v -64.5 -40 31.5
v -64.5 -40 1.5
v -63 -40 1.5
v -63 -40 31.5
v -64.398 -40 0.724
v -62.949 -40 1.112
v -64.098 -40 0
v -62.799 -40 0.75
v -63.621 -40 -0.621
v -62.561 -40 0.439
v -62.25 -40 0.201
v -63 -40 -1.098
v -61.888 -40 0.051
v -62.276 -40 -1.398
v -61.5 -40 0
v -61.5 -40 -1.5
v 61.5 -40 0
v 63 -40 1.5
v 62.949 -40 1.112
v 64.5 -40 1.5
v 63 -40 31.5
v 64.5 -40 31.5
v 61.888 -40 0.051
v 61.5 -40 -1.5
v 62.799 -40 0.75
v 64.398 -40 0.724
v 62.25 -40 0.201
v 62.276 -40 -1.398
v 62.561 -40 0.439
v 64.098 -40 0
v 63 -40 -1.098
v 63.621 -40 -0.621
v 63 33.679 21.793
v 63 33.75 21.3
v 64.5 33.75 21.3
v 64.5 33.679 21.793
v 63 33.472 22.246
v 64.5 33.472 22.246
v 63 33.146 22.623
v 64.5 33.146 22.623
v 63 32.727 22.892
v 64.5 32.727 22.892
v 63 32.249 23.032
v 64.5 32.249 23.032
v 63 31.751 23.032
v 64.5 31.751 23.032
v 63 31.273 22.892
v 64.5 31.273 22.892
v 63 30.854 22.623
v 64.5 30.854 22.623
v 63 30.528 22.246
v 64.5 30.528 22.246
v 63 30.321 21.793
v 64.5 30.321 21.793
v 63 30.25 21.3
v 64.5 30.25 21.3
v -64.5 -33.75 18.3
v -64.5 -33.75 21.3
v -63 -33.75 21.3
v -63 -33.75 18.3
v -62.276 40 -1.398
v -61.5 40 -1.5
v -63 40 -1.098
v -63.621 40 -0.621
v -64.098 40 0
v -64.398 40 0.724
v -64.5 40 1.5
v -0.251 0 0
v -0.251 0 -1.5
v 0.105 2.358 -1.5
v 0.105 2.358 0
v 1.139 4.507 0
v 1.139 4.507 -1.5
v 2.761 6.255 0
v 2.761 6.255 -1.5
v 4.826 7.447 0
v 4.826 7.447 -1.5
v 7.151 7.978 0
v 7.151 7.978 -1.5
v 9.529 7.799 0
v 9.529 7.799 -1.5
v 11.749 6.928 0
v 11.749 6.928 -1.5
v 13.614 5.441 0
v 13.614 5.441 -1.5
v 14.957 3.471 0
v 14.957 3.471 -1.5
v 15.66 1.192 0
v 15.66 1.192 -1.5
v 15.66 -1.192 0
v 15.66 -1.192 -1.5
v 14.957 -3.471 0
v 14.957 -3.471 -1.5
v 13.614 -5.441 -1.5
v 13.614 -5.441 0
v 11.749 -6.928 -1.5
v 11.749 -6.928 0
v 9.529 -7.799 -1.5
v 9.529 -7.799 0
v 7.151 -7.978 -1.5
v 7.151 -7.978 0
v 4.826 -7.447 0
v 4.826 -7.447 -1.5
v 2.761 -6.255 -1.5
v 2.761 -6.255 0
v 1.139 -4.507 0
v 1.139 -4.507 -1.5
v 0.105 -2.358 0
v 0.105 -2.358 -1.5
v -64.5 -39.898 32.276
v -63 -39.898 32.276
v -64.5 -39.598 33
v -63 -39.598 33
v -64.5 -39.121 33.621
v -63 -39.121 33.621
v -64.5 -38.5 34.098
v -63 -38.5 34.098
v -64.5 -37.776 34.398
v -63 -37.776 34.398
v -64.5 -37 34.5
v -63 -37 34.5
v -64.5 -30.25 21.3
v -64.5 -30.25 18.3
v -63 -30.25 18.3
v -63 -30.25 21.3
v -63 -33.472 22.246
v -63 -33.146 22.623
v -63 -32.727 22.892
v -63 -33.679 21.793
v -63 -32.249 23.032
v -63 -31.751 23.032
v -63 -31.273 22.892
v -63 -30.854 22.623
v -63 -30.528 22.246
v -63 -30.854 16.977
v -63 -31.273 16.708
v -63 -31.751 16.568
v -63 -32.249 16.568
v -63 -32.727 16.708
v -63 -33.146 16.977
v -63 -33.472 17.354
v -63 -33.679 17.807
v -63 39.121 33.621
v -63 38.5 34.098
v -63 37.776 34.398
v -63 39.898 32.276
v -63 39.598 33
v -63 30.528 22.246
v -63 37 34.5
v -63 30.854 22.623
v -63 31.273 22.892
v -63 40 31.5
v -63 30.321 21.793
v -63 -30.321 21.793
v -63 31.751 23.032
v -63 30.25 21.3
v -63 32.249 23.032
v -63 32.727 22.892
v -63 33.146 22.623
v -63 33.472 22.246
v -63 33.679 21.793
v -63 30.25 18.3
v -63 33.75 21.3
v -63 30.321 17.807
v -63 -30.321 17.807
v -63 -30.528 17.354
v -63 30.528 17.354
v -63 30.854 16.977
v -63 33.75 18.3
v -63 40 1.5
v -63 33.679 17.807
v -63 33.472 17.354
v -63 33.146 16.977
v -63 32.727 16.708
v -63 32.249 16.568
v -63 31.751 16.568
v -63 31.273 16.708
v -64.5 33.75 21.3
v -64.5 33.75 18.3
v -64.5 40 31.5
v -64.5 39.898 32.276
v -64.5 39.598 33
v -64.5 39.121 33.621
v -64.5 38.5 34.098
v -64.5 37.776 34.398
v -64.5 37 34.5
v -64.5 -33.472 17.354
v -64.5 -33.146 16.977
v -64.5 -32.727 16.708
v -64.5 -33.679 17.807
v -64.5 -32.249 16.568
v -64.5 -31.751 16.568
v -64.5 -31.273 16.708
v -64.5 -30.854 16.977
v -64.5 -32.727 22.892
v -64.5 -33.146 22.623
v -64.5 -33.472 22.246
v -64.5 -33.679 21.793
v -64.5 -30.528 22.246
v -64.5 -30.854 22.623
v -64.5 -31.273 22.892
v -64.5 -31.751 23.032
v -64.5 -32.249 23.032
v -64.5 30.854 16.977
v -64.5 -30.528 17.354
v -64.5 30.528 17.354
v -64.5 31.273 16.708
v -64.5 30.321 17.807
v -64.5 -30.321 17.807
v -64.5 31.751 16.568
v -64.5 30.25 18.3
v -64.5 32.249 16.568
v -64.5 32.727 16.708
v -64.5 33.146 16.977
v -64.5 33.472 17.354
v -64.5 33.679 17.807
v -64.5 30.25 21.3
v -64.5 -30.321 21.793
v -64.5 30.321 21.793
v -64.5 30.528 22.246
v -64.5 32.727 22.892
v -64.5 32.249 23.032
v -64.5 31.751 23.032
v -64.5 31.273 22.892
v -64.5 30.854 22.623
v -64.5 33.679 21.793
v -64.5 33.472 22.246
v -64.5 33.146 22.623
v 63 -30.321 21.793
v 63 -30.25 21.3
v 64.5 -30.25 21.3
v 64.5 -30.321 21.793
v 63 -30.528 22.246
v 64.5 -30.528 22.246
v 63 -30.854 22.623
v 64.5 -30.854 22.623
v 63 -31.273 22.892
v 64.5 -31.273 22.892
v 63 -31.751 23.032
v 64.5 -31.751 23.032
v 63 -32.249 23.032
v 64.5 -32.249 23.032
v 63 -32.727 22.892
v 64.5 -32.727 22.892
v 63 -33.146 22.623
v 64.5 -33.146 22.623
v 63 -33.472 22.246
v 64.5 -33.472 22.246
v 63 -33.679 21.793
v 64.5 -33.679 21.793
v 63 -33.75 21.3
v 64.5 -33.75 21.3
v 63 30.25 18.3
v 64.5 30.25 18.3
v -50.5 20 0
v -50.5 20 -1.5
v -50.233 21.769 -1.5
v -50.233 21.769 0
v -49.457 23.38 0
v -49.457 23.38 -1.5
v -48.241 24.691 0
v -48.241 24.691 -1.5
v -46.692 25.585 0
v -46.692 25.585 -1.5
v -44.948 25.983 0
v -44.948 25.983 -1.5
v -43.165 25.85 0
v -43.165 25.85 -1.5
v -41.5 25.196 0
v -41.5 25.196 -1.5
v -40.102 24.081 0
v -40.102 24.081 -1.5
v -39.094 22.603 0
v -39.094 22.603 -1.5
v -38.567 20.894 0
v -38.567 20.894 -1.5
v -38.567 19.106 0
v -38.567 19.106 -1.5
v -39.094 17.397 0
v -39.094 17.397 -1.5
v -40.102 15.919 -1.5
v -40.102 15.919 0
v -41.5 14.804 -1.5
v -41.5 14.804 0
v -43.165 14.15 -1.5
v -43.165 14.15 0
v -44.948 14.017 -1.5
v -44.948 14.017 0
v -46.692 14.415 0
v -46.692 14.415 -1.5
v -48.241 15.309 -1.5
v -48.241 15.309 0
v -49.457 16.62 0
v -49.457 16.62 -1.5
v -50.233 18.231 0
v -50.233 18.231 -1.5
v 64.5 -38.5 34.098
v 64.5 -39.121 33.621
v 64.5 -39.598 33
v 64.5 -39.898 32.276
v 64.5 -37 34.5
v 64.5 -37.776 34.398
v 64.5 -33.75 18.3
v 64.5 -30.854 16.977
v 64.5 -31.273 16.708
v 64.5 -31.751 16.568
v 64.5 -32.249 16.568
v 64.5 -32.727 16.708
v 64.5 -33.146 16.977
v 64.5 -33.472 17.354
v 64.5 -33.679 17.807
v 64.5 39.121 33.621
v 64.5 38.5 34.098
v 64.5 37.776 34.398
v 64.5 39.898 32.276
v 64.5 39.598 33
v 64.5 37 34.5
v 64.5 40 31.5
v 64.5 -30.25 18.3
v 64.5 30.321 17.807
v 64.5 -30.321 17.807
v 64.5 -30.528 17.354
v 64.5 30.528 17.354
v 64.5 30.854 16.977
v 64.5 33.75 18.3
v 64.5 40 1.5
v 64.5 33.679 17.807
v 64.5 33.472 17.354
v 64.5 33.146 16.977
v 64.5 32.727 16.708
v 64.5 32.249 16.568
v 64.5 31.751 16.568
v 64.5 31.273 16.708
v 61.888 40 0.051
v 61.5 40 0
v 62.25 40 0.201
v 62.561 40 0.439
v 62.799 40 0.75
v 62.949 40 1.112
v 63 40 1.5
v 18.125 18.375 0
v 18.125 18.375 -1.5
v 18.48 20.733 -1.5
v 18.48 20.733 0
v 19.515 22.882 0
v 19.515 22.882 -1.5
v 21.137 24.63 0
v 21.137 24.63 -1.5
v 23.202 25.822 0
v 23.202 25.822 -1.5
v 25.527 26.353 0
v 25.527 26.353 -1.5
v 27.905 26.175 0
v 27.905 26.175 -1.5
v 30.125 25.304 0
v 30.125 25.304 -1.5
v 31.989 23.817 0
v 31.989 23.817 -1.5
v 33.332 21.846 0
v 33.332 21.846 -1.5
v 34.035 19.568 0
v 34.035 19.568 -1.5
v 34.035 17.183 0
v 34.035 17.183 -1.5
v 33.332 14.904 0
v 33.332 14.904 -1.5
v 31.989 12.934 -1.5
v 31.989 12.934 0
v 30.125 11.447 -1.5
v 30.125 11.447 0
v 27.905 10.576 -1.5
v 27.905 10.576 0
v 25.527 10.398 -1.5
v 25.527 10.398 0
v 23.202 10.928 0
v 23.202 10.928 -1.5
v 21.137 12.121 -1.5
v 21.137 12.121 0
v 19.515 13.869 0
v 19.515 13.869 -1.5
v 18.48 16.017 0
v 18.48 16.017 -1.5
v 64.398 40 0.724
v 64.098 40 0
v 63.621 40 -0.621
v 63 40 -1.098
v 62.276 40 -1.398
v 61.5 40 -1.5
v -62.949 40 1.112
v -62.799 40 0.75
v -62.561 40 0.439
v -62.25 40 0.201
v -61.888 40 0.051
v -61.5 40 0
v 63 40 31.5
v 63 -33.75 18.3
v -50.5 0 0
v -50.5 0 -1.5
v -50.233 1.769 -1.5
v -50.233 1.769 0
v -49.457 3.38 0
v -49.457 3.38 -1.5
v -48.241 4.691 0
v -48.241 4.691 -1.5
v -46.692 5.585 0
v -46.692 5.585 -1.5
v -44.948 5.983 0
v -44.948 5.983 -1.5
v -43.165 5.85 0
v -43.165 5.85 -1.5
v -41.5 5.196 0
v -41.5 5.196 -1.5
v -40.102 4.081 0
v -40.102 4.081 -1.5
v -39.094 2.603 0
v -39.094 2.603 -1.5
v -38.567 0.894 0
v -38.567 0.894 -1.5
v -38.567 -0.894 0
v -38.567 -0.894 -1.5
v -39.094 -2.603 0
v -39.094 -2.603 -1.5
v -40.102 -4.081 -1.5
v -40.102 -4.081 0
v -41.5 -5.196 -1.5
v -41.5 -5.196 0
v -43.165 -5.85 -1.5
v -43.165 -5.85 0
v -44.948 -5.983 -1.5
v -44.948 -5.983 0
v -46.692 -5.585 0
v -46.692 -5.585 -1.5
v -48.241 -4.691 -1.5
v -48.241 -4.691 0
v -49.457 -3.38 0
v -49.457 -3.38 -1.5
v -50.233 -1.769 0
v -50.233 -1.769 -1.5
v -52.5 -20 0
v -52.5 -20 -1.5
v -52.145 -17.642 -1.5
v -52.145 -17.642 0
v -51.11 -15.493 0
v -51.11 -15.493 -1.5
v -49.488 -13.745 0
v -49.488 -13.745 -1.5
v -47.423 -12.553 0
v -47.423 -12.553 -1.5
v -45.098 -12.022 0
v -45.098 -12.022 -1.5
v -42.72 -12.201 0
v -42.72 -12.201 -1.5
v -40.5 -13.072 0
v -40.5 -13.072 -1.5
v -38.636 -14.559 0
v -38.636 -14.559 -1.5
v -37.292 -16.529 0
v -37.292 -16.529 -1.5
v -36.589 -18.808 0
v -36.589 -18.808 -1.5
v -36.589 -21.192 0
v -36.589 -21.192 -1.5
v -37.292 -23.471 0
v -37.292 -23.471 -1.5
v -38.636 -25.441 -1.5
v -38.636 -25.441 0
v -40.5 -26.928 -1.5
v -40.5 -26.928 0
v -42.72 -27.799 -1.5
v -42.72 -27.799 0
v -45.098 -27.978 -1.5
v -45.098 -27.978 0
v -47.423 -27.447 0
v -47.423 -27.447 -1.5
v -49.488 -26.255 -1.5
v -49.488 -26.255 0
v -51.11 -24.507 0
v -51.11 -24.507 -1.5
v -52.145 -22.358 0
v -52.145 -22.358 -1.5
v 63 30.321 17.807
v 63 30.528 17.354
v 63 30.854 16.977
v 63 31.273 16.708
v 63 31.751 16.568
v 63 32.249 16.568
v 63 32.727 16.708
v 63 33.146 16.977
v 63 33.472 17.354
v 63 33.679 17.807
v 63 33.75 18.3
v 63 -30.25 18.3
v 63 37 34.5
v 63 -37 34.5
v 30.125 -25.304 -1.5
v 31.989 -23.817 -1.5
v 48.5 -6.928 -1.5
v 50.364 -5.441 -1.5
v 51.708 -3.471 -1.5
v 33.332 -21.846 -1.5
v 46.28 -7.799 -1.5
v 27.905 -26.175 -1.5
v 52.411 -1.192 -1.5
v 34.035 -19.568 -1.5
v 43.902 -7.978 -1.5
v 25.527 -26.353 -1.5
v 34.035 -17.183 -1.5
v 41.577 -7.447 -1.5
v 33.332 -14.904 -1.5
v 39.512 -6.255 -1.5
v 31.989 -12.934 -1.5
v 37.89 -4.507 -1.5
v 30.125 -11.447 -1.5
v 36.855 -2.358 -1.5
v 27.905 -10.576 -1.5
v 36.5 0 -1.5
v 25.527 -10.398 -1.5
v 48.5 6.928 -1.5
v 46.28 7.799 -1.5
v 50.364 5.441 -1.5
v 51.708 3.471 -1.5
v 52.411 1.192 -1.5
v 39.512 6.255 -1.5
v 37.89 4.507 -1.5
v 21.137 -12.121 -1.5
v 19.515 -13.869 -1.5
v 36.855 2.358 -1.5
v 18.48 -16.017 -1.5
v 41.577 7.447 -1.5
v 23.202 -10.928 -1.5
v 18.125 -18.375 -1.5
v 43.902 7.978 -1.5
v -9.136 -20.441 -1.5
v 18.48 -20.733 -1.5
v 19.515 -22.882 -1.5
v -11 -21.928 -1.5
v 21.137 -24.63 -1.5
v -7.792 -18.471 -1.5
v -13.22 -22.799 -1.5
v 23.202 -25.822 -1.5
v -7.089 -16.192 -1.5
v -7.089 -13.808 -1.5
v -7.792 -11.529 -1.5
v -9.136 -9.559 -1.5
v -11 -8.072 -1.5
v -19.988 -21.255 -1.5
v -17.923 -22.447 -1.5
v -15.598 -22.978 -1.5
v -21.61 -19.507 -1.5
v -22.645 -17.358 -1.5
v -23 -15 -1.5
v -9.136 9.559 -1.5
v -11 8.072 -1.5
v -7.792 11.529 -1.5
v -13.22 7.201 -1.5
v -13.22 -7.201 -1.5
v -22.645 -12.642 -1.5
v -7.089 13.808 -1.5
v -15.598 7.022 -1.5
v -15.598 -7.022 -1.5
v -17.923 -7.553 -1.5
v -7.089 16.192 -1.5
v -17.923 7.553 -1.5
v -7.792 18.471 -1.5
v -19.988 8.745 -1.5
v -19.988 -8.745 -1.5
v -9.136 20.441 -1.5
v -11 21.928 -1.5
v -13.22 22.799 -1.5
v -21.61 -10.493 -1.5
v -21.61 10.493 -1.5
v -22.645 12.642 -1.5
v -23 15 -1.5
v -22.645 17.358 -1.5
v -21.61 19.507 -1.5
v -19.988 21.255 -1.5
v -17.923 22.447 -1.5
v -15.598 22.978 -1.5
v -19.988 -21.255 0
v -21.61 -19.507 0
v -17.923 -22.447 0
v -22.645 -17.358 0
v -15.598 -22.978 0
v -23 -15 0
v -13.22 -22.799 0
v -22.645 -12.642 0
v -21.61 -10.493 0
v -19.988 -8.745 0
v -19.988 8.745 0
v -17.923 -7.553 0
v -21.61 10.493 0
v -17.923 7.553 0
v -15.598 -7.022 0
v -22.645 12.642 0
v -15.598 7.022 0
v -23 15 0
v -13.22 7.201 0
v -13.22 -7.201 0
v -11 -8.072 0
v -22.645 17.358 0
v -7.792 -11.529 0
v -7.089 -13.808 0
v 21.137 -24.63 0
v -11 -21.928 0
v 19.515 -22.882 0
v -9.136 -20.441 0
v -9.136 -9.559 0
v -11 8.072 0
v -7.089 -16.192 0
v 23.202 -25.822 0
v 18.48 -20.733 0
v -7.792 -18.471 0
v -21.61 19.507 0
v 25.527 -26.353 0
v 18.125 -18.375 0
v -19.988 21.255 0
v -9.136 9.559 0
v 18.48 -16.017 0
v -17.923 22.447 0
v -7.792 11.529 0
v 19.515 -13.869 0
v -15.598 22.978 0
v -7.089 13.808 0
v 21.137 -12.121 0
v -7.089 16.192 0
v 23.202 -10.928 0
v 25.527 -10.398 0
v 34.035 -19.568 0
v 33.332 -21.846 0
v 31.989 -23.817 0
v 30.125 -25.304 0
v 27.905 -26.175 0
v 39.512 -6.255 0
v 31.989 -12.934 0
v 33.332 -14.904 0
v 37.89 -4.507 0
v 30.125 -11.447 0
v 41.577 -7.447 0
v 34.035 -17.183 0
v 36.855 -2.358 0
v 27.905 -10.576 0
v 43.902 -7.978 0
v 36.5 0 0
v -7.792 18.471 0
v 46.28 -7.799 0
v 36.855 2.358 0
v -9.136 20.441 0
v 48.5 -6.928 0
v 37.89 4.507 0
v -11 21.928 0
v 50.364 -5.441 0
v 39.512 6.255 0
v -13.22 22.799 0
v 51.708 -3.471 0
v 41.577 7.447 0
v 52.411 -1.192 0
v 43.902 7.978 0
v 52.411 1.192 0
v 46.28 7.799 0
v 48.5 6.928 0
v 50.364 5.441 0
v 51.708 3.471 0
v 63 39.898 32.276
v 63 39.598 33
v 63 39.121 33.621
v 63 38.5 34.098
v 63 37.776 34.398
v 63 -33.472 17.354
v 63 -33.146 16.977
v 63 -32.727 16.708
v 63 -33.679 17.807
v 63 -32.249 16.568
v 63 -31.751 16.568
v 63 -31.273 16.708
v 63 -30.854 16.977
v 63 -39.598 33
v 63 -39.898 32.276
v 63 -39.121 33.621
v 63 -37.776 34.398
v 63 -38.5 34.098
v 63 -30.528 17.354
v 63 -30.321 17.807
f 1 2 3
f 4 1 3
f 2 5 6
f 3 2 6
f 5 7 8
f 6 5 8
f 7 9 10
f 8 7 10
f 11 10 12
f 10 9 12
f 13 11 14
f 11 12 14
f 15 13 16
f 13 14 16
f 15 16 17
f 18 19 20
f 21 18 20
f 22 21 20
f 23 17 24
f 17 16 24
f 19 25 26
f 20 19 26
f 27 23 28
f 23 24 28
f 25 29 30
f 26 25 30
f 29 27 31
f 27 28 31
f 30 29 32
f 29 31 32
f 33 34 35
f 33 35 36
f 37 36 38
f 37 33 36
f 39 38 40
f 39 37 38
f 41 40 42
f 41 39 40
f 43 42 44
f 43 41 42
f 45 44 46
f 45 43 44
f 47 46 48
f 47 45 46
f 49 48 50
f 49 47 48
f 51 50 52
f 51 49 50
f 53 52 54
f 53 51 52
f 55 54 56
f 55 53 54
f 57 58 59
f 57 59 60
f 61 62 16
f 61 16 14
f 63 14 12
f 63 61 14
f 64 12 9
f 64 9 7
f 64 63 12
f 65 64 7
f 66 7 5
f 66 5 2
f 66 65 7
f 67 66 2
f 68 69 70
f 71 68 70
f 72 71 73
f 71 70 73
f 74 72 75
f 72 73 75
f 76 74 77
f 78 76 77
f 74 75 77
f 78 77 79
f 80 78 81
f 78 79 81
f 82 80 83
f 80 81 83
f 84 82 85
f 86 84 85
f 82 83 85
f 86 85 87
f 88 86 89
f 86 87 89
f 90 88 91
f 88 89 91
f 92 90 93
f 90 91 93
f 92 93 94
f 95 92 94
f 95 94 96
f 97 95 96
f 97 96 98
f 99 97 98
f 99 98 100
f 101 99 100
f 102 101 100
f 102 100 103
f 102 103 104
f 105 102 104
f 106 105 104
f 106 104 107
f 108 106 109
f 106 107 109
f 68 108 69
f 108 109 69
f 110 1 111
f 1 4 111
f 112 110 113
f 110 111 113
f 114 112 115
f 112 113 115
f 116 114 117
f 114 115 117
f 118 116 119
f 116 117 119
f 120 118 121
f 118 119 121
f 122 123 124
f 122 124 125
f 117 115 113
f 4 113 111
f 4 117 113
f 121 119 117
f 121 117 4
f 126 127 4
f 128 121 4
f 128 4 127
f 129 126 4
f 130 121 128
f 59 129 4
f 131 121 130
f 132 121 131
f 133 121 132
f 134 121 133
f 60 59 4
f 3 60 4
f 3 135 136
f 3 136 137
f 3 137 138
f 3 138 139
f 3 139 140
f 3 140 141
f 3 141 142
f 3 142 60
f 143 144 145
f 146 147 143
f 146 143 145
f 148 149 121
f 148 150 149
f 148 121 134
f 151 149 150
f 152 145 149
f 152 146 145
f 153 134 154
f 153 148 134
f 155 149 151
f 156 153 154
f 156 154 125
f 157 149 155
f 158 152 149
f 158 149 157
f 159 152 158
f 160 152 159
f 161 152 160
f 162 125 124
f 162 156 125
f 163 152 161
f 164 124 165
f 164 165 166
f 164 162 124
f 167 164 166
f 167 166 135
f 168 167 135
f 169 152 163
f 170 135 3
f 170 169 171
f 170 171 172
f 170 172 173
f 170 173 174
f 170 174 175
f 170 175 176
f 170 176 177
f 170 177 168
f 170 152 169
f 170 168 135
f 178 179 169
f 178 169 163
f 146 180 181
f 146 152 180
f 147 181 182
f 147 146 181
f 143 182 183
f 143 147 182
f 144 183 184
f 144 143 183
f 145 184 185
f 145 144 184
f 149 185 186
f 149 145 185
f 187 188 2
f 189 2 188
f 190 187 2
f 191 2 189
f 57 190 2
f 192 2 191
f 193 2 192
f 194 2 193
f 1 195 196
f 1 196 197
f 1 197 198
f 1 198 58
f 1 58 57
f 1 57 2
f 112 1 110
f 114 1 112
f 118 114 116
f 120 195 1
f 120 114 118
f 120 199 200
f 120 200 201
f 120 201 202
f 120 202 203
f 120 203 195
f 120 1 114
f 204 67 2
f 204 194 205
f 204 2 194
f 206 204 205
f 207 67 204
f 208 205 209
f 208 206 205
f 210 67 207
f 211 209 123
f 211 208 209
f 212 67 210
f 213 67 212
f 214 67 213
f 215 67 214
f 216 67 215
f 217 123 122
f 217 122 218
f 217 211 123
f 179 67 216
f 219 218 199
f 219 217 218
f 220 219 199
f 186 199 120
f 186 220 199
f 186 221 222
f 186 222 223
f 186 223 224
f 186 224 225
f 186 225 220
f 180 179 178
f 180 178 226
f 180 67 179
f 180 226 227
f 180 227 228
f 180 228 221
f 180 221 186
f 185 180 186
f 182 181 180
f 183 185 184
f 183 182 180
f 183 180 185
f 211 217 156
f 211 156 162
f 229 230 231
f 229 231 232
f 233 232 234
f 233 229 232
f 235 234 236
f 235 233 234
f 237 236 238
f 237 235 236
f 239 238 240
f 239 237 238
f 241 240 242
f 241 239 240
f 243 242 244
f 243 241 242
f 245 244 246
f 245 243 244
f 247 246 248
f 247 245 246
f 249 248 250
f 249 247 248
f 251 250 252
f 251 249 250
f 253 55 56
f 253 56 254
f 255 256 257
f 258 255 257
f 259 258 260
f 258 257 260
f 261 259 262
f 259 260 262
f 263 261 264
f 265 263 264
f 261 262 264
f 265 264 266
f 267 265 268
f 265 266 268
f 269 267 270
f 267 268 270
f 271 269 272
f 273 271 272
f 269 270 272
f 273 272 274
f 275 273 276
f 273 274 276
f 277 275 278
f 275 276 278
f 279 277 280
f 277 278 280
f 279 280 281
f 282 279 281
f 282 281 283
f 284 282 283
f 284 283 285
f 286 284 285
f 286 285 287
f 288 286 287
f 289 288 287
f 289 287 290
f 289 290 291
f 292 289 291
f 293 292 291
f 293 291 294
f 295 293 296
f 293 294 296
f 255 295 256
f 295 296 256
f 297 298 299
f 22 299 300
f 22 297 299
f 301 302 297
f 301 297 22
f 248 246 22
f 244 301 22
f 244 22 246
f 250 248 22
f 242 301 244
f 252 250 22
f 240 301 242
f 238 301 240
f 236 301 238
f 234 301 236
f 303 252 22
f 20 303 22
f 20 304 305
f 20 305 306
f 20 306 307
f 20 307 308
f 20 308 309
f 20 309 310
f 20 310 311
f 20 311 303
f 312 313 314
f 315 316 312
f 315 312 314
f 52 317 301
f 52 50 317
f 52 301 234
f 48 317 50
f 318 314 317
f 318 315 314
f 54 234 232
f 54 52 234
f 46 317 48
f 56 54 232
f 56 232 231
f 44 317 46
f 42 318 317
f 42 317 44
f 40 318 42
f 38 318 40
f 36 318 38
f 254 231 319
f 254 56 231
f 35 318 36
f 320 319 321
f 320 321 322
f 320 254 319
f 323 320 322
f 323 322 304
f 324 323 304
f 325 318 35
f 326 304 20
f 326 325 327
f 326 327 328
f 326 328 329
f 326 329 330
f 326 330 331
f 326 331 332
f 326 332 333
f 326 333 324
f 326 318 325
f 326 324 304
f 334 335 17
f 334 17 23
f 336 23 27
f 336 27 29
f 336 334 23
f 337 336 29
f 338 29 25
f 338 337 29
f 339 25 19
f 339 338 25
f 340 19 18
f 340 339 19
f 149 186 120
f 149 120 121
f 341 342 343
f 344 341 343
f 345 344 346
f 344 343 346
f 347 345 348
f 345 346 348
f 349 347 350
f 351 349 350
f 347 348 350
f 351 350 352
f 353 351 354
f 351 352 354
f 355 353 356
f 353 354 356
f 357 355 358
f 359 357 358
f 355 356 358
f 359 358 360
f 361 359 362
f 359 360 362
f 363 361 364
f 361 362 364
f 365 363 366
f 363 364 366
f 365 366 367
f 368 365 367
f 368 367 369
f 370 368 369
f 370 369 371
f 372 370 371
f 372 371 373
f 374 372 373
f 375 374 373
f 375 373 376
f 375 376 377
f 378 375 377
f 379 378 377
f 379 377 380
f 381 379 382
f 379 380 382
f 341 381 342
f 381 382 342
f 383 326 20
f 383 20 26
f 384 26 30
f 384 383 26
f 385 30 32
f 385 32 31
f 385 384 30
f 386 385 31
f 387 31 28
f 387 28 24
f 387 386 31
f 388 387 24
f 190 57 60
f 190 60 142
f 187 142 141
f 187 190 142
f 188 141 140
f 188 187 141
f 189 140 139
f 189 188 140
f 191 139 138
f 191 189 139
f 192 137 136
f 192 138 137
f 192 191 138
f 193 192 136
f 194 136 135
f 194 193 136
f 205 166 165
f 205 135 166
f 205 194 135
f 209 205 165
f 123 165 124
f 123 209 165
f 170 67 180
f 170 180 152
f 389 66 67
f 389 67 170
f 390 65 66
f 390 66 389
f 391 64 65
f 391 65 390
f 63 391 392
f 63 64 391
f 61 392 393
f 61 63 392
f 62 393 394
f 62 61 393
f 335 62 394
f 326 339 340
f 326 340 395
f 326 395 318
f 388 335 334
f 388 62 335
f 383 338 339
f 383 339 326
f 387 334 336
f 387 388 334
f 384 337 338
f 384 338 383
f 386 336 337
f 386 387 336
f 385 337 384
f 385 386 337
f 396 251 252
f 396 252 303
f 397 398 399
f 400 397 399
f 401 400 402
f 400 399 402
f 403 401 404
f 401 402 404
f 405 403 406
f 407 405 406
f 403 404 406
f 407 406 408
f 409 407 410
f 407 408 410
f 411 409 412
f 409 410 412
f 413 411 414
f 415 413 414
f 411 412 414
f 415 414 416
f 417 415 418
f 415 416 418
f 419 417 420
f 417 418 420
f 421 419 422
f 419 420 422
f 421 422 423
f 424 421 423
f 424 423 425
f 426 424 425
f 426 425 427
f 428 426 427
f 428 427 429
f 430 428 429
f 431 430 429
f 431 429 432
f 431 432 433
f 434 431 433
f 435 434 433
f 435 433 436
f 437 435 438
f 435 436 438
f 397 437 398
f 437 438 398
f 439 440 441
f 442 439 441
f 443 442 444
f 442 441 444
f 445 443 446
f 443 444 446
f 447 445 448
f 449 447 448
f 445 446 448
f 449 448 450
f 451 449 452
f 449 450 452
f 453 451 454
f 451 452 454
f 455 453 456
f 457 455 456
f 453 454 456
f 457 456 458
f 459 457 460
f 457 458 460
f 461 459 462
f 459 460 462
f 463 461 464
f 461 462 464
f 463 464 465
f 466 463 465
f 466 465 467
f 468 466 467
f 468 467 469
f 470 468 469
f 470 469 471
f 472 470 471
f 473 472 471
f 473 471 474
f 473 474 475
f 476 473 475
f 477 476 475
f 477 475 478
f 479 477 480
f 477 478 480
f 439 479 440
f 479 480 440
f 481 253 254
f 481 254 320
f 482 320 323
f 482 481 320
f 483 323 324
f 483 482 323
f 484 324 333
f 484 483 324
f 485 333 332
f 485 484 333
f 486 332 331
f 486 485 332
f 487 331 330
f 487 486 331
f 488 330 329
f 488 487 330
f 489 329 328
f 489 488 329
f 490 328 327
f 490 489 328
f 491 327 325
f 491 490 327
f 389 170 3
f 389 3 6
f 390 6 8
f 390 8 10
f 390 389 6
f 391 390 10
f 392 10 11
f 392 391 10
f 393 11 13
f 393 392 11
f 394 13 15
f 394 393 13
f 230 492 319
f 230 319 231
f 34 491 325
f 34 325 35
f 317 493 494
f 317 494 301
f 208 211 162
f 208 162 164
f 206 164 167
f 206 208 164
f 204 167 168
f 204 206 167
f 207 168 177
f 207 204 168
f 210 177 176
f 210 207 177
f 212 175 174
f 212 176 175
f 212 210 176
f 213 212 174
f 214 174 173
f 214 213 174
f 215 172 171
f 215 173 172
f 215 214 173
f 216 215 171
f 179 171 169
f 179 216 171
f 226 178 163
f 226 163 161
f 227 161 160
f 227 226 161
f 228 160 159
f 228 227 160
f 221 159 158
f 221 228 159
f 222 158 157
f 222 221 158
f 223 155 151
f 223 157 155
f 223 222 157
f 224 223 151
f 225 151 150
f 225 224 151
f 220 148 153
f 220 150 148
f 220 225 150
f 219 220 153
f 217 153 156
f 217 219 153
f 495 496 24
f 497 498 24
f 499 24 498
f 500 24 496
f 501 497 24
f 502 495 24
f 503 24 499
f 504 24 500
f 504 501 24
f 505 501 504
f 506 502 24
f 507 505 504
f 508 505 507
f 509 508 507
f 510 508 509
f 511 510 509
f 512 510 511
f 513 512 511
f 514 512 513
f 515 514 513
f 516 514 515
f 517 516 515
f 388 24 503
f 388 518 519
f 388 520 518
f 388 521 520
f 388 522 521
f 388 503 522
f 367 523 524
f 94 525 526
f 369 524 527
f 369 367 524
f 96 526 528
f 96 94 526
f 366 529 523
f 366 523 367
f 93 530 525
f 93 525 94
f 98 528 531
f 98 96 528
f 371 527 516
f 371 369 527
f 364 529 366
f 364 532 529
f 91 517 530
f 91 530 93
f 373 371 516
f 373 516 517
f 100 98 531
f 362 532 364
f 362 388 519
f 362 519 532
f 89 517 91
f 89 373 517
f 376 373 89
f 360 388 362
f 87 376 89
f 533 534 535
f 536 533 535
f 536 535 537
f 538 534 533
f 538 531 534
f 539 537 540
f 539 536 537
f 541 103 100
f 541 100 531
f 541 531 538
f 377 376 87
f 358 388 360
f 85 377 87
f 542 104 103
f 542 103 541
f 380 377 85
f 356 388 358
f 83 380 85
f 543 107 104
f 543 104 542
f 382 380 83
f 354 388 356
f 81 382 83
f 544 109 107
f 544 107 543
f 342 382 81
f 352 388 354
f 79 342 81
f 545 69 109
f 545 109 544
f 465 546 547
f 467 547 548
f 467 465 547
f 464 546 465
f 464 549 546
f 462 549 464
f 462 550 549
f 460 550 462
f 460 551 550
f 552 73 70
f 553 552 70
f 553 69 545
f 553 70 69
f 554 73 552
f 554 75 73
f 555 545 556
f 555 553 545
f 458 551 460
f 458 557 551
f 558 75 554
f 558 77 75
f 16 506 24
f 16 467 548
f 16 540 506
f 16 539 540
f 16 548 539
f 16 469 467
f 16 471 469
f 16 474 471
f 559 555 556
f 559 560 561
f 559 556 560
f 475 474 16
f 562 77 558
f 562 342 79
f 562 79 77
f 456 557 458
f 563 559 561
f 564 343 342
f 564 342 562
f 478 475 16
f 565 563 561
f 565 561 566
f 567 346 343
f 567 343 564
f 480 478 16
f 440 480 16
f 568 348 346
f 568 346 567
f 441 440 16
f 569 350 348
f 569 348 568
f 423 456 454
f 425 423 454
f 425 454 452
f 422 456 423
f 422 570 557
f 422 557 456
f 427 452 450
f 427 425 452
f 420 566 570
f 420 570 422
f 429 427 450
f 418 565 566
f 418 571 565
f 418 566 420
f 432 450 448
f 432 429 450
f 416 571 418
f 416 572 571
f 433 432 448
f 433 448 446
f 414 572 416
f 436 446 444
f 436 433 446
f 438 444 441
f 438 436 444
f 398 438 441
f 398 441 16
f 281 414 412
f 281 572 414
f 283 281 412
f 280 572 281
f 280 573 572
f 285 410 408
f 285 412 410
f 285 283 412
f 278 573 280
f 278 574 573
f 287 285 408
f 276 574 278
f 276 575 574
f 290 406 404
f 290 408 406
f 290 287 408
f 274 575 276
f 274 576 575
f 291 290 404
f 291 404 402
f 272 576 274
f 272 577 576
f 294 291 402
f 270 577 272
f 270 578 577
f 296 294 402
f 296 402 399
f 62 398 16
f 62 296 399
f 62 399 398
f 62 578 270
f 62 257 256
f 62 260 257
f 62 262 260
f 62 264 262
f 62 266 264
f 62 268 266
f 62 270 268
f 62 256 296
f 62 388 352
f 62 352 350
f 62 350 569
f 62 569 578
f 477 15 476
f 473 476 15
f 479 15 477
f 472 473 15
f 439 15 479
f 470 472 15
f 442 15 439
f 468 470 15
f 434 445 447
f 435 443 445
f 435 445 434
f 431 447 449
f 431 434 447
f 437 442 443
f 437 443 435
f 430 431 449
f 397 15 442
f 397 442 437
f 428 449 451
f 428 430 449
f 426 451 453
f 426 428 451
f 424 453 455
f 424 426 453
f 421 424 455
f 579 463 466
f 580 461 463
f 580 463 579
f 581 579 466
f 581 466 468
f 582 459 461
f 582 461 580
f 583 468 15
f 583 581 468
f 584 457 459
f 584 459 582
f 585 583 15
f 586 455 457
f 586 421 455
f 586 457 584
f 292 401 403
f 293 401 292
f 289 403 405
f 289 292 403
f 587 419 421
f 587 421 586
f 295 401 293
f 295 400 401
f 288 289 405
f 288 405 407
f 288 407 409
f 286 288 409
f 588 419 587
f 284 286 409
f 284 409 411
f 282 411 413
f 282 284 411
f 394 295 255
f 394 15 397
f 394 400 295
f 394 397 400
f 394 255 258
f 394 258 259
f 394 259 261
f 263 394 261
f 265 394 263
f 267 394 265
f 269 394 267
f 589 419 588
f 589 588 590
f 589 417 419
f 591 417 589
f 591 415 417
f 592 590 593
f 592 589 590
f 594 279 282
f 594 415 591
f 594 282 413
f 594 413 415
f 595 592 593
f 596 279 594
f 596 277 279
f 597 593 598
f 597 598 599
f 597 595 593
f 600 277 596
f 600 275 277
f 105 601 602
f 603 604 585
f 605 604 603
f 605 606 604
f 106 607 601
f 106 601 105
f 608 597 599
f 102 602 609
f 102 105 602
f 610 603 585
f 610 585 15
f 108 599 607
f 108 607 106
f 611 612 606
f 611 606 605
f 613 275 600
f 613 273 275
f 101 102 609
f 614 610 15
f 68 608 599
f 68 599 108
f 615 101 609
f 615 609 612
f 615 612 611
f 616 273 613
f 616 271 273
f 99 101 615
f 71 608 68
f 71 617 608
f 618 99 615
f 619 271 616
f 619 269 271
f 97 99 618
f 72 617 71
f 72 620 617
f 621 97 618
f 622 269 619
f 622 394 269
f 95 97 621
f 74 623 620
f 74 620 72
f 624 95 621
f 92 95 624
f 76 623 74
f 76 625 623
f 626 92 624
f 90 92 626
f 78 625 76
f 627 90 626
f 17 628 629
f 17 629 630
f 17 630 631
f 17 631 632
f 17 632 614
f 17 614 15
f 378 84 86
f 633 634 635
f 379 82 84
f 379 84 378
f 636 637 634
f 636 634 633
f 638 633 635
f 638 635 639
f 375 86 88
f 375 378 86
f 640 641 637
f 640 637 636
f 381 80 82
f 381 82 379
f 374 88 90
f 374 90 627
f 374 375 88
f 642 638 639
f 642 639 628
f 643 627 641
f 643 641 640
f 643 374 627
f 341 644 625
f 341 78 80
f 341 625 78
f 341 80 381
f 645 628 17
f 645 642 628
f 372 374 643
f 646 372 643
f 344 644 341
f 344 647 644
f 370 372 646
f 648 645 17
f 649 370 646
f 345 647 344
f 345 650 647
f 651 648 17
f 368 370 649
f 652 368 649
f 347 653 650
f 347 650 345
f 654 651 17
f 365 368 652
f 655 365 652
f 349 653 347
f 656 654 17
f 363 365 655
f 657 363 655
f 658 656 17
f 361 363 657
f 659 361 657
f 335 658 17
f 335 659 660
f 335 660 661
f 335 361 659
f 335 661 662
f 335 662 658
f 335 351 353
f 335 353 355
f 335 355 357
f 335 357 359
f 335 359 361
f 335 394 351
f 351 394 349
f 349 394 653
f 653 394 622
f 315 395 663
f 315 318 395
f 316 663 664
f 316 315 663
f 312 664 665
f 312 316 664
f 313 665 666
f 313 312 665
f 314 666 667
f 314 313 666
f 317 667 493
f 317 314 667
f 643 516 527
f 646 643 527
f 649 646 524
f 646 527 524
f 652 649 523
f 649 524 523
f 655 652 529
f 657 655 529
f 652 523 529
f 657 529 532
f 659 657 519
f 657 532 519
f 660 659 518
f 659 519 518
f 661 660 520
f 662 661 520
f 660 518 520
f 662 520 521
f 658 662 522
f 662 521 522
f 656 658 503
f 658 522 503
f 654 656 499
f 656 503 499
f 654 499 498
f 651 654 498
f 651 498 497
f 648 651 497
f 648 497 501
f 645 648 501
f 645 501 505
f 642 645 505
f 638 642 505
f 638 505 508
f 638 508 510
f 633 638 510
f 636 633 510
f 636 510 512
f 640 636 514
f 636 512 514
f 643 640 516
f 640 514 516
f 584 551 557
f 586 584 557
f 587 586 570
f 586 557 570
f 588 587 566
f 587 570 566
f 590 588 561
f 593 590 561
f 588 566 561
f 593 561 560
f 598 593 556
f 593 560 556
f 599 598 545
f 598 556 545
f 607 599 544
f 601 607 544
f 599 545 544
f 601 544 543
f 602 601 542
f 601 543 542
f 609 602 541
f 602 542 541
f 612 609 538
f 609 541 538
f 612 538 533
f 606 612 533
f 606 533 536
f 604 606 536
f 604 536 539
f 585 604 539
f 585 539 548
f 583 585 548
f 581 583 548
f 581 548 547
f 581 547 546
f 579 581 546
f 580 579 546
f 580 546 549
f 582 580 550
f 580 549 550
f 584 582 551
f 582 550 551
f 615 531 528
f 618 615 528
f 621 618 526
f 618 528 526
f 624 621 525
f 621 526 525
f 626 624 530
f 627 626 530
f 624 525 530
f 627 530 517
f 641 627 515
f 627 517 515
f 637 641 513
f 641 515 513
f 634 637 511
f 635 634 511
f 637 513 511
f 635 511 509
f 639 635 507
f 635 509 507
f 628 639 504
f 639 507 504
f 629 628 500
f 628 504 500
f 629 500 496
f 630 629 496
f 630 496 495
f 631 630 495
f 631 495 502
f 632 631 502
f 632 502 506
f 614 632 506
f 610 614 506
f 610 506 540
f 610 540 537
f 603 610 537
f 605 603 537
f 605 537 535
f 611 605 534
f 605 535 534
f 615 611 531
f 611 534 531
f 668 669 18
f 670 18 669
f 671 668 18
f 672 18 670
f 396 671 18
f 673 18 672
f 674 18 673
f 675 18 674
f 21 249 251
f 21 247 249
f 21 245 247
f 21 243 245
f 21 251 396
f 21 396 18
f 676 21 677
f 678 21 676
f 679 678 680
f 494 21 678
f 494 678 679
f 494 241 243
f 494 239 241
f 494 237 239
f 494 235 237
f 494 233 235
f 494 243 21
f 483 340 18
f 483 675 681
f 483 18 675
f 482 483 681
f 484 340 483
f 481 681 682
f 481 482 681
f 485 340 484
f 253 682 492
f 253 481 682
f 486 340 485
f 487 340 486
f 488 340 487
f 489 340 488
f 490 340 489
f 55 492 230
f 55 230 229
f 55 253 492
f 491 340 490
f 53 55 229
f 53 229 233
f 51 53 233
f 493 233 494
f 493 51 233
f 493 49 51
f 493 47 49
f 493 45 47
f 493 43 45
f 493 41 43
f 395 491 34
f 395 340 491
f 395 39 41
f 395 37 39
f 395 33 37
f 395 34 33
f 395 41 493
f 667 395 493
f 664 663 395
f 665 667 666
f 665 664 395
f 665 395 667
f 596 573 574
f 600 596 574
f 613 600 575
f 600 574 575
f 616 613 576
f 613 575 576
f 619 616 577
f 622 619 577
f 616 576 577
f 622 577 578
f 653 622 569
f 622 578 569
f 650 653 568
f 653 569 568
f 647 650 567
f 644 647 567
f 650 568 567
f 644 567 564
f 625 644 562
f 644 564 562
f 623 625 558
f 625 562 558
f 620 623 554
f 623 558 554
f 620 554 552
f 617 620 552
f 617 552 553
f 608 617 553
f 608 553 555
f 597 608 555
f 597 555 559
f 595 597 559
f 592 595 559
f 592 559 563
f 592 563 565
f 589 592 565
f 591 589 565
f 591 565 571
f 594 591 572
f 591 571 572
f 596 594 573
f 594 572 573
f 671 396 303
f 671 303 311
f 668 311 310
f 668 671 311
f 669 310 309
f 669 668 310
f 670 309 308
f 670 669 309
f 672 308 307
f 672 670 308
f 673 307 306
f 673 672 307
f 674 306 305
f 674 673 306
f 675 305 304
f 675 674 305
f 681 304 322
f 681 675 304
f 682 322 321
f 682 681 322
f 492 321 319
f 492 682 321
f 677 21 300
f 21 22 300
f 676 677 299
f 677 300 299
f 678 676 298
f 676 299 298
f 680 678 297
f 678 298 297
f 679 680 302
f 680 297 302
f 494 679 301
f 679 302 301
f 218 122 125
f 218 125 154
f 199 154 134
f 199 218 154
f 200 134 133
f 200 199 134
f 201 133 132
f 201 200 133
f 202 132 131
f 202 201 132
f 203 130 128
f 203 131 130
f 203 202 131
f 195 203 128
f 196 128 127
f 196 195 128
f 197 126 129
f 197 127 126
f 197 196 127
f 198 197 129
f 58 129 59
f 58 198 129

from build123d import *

# Parameters (mm, degrees)
FLANGE_BASE1_DEPTH    = 40
ESBO_O4_R             = 6
ESBO_O4_R_2           = 8
CORTE_EXTRUS_O1_DEPTH = 1.5
FILETE1_R             = 3
CORTE_EXTRUS_O2_DEPTH = 140.396018595


# Sheet-metal steps are written as plain solids
with BuildPart() as part:
    # Esboço2 → Flange-base1 (new, symmetric)
    with BuildSketch(Plane(origin=(0, 0, 0), x_dir=(1, 0, 0), z_dir=(0, 1, 0))):
        with BuildLine():
            Line((-63, -34.5), (-63, -1.5))
            ThreePointArc((-63, -1.5), (-62.560660172, -0.439339828), (-61.5, 0))
            Line((-61.5, 0), (61.5, 0))
            ThreePointArc((61.5, 0), (62.560660172, -0.439339828), (63, -1.5))
            Line((63, -1.5), (63, -34.5))
            Line((63, -34.5), (64.5, -34.5))
            Line((64.5, -34.5), (64.5, -1.5))
            ThreePointArc((64.5, -1.5), (63.621320344, 0.621320344), (61.5, 1.5))
            Line((61.5, 1.5), (-61.5, 1.5))
            ThreePointArc((-61.5, 1.5), (-63.621320344, 0.621320344), (-64.5, -1.5))
            Line((-64.5, -1.5), (-64.5, -34.5))
            Line((-64.5, -34.5), (-63, -34.5))
        make_face()
    extrude(amount=FLANGE_BASE1_DEPTH, both=True)

    # Esboço4 → Corte-extrusão1 (cut)
    with BuildSketch(Plane(origin=(0, 0, -1.5), x_dir=(-1, 0, 0), z_dir=(0, 0, -1))):
        with Locations((44.5, 0)):
            Circle(ESBO_O4_R)
        with Locations((44.5, -20)):
            Circle(ESBO_O4_R_2)
        with Locations((44.5, 20)):
            Circle(ESBO_O4_R)
        with Locations((15, 15)):
            Circle(ESBO_O4_R_2)
        with Locations((-44.5, 0)):
            Circle(ESBO_O4_R_2)
        with Locations((-26.124574835, 18.375425165)):
            Circle(ESBO_O4_R_2)
        with Locations((-7.74914967, 0)):
            Circle(ESBO_O4_R_2)
        with Locations((-26.124574835, -18.375425165)):
            Circle(ESBO_O4_R_2)
        with Locations((15, -15)):
            Circle(ESBO_O4_R_2)
    extrude(amount=-CORTE_EXTRUS_O1_DEPTH, mode=Mode.SUBTRACT)

    # Filete1
    filete1_edges = [part.edges().sort_by_distance(p)[0] for p in [
        (63.75, -40, 34.5),
        (-63.75, -40, 34.5),
        (63.75, 40, 34.5),
        (-63.75, 40, 34.5),
    ]]
    fillet(filete1_edges, radius=FILETE1_R)

    # Esboço5 → Corte-extrusão2 (cut, through all)
    with BuildSketch(Plane.ZY.offset(64.5)):
        with BuildLine():
            Line((18.3, 33.75), (21.3, 33.75))
            ThreePointArc((21.3, 33.75), (23.05, 32), (21.3, 30.25))
            Line((21.3, 30.25), (18.3, 30.25))
            ThreePointArc((18.3, 30.25), (16.55, 32), (18.3, 33.75))
        make_face()
        with BuildLine():
            Line((18.3, -30.25), (21.3, -30.25))
            ThreePointArc((21.3, -30.25), (23.05, -32), (21.3, -33.75))
            Line((21.3, -33.75), (18.3, -33.75))
            ThreePointArc((18.3, -33.75), (16.55, -32), (18.3, -30.25))
        make_face()
    extrude(amount=-CORTE_EXTRUS_O2_DEPTH, mode=Mode.SUBTRACT)


solid = part.part
